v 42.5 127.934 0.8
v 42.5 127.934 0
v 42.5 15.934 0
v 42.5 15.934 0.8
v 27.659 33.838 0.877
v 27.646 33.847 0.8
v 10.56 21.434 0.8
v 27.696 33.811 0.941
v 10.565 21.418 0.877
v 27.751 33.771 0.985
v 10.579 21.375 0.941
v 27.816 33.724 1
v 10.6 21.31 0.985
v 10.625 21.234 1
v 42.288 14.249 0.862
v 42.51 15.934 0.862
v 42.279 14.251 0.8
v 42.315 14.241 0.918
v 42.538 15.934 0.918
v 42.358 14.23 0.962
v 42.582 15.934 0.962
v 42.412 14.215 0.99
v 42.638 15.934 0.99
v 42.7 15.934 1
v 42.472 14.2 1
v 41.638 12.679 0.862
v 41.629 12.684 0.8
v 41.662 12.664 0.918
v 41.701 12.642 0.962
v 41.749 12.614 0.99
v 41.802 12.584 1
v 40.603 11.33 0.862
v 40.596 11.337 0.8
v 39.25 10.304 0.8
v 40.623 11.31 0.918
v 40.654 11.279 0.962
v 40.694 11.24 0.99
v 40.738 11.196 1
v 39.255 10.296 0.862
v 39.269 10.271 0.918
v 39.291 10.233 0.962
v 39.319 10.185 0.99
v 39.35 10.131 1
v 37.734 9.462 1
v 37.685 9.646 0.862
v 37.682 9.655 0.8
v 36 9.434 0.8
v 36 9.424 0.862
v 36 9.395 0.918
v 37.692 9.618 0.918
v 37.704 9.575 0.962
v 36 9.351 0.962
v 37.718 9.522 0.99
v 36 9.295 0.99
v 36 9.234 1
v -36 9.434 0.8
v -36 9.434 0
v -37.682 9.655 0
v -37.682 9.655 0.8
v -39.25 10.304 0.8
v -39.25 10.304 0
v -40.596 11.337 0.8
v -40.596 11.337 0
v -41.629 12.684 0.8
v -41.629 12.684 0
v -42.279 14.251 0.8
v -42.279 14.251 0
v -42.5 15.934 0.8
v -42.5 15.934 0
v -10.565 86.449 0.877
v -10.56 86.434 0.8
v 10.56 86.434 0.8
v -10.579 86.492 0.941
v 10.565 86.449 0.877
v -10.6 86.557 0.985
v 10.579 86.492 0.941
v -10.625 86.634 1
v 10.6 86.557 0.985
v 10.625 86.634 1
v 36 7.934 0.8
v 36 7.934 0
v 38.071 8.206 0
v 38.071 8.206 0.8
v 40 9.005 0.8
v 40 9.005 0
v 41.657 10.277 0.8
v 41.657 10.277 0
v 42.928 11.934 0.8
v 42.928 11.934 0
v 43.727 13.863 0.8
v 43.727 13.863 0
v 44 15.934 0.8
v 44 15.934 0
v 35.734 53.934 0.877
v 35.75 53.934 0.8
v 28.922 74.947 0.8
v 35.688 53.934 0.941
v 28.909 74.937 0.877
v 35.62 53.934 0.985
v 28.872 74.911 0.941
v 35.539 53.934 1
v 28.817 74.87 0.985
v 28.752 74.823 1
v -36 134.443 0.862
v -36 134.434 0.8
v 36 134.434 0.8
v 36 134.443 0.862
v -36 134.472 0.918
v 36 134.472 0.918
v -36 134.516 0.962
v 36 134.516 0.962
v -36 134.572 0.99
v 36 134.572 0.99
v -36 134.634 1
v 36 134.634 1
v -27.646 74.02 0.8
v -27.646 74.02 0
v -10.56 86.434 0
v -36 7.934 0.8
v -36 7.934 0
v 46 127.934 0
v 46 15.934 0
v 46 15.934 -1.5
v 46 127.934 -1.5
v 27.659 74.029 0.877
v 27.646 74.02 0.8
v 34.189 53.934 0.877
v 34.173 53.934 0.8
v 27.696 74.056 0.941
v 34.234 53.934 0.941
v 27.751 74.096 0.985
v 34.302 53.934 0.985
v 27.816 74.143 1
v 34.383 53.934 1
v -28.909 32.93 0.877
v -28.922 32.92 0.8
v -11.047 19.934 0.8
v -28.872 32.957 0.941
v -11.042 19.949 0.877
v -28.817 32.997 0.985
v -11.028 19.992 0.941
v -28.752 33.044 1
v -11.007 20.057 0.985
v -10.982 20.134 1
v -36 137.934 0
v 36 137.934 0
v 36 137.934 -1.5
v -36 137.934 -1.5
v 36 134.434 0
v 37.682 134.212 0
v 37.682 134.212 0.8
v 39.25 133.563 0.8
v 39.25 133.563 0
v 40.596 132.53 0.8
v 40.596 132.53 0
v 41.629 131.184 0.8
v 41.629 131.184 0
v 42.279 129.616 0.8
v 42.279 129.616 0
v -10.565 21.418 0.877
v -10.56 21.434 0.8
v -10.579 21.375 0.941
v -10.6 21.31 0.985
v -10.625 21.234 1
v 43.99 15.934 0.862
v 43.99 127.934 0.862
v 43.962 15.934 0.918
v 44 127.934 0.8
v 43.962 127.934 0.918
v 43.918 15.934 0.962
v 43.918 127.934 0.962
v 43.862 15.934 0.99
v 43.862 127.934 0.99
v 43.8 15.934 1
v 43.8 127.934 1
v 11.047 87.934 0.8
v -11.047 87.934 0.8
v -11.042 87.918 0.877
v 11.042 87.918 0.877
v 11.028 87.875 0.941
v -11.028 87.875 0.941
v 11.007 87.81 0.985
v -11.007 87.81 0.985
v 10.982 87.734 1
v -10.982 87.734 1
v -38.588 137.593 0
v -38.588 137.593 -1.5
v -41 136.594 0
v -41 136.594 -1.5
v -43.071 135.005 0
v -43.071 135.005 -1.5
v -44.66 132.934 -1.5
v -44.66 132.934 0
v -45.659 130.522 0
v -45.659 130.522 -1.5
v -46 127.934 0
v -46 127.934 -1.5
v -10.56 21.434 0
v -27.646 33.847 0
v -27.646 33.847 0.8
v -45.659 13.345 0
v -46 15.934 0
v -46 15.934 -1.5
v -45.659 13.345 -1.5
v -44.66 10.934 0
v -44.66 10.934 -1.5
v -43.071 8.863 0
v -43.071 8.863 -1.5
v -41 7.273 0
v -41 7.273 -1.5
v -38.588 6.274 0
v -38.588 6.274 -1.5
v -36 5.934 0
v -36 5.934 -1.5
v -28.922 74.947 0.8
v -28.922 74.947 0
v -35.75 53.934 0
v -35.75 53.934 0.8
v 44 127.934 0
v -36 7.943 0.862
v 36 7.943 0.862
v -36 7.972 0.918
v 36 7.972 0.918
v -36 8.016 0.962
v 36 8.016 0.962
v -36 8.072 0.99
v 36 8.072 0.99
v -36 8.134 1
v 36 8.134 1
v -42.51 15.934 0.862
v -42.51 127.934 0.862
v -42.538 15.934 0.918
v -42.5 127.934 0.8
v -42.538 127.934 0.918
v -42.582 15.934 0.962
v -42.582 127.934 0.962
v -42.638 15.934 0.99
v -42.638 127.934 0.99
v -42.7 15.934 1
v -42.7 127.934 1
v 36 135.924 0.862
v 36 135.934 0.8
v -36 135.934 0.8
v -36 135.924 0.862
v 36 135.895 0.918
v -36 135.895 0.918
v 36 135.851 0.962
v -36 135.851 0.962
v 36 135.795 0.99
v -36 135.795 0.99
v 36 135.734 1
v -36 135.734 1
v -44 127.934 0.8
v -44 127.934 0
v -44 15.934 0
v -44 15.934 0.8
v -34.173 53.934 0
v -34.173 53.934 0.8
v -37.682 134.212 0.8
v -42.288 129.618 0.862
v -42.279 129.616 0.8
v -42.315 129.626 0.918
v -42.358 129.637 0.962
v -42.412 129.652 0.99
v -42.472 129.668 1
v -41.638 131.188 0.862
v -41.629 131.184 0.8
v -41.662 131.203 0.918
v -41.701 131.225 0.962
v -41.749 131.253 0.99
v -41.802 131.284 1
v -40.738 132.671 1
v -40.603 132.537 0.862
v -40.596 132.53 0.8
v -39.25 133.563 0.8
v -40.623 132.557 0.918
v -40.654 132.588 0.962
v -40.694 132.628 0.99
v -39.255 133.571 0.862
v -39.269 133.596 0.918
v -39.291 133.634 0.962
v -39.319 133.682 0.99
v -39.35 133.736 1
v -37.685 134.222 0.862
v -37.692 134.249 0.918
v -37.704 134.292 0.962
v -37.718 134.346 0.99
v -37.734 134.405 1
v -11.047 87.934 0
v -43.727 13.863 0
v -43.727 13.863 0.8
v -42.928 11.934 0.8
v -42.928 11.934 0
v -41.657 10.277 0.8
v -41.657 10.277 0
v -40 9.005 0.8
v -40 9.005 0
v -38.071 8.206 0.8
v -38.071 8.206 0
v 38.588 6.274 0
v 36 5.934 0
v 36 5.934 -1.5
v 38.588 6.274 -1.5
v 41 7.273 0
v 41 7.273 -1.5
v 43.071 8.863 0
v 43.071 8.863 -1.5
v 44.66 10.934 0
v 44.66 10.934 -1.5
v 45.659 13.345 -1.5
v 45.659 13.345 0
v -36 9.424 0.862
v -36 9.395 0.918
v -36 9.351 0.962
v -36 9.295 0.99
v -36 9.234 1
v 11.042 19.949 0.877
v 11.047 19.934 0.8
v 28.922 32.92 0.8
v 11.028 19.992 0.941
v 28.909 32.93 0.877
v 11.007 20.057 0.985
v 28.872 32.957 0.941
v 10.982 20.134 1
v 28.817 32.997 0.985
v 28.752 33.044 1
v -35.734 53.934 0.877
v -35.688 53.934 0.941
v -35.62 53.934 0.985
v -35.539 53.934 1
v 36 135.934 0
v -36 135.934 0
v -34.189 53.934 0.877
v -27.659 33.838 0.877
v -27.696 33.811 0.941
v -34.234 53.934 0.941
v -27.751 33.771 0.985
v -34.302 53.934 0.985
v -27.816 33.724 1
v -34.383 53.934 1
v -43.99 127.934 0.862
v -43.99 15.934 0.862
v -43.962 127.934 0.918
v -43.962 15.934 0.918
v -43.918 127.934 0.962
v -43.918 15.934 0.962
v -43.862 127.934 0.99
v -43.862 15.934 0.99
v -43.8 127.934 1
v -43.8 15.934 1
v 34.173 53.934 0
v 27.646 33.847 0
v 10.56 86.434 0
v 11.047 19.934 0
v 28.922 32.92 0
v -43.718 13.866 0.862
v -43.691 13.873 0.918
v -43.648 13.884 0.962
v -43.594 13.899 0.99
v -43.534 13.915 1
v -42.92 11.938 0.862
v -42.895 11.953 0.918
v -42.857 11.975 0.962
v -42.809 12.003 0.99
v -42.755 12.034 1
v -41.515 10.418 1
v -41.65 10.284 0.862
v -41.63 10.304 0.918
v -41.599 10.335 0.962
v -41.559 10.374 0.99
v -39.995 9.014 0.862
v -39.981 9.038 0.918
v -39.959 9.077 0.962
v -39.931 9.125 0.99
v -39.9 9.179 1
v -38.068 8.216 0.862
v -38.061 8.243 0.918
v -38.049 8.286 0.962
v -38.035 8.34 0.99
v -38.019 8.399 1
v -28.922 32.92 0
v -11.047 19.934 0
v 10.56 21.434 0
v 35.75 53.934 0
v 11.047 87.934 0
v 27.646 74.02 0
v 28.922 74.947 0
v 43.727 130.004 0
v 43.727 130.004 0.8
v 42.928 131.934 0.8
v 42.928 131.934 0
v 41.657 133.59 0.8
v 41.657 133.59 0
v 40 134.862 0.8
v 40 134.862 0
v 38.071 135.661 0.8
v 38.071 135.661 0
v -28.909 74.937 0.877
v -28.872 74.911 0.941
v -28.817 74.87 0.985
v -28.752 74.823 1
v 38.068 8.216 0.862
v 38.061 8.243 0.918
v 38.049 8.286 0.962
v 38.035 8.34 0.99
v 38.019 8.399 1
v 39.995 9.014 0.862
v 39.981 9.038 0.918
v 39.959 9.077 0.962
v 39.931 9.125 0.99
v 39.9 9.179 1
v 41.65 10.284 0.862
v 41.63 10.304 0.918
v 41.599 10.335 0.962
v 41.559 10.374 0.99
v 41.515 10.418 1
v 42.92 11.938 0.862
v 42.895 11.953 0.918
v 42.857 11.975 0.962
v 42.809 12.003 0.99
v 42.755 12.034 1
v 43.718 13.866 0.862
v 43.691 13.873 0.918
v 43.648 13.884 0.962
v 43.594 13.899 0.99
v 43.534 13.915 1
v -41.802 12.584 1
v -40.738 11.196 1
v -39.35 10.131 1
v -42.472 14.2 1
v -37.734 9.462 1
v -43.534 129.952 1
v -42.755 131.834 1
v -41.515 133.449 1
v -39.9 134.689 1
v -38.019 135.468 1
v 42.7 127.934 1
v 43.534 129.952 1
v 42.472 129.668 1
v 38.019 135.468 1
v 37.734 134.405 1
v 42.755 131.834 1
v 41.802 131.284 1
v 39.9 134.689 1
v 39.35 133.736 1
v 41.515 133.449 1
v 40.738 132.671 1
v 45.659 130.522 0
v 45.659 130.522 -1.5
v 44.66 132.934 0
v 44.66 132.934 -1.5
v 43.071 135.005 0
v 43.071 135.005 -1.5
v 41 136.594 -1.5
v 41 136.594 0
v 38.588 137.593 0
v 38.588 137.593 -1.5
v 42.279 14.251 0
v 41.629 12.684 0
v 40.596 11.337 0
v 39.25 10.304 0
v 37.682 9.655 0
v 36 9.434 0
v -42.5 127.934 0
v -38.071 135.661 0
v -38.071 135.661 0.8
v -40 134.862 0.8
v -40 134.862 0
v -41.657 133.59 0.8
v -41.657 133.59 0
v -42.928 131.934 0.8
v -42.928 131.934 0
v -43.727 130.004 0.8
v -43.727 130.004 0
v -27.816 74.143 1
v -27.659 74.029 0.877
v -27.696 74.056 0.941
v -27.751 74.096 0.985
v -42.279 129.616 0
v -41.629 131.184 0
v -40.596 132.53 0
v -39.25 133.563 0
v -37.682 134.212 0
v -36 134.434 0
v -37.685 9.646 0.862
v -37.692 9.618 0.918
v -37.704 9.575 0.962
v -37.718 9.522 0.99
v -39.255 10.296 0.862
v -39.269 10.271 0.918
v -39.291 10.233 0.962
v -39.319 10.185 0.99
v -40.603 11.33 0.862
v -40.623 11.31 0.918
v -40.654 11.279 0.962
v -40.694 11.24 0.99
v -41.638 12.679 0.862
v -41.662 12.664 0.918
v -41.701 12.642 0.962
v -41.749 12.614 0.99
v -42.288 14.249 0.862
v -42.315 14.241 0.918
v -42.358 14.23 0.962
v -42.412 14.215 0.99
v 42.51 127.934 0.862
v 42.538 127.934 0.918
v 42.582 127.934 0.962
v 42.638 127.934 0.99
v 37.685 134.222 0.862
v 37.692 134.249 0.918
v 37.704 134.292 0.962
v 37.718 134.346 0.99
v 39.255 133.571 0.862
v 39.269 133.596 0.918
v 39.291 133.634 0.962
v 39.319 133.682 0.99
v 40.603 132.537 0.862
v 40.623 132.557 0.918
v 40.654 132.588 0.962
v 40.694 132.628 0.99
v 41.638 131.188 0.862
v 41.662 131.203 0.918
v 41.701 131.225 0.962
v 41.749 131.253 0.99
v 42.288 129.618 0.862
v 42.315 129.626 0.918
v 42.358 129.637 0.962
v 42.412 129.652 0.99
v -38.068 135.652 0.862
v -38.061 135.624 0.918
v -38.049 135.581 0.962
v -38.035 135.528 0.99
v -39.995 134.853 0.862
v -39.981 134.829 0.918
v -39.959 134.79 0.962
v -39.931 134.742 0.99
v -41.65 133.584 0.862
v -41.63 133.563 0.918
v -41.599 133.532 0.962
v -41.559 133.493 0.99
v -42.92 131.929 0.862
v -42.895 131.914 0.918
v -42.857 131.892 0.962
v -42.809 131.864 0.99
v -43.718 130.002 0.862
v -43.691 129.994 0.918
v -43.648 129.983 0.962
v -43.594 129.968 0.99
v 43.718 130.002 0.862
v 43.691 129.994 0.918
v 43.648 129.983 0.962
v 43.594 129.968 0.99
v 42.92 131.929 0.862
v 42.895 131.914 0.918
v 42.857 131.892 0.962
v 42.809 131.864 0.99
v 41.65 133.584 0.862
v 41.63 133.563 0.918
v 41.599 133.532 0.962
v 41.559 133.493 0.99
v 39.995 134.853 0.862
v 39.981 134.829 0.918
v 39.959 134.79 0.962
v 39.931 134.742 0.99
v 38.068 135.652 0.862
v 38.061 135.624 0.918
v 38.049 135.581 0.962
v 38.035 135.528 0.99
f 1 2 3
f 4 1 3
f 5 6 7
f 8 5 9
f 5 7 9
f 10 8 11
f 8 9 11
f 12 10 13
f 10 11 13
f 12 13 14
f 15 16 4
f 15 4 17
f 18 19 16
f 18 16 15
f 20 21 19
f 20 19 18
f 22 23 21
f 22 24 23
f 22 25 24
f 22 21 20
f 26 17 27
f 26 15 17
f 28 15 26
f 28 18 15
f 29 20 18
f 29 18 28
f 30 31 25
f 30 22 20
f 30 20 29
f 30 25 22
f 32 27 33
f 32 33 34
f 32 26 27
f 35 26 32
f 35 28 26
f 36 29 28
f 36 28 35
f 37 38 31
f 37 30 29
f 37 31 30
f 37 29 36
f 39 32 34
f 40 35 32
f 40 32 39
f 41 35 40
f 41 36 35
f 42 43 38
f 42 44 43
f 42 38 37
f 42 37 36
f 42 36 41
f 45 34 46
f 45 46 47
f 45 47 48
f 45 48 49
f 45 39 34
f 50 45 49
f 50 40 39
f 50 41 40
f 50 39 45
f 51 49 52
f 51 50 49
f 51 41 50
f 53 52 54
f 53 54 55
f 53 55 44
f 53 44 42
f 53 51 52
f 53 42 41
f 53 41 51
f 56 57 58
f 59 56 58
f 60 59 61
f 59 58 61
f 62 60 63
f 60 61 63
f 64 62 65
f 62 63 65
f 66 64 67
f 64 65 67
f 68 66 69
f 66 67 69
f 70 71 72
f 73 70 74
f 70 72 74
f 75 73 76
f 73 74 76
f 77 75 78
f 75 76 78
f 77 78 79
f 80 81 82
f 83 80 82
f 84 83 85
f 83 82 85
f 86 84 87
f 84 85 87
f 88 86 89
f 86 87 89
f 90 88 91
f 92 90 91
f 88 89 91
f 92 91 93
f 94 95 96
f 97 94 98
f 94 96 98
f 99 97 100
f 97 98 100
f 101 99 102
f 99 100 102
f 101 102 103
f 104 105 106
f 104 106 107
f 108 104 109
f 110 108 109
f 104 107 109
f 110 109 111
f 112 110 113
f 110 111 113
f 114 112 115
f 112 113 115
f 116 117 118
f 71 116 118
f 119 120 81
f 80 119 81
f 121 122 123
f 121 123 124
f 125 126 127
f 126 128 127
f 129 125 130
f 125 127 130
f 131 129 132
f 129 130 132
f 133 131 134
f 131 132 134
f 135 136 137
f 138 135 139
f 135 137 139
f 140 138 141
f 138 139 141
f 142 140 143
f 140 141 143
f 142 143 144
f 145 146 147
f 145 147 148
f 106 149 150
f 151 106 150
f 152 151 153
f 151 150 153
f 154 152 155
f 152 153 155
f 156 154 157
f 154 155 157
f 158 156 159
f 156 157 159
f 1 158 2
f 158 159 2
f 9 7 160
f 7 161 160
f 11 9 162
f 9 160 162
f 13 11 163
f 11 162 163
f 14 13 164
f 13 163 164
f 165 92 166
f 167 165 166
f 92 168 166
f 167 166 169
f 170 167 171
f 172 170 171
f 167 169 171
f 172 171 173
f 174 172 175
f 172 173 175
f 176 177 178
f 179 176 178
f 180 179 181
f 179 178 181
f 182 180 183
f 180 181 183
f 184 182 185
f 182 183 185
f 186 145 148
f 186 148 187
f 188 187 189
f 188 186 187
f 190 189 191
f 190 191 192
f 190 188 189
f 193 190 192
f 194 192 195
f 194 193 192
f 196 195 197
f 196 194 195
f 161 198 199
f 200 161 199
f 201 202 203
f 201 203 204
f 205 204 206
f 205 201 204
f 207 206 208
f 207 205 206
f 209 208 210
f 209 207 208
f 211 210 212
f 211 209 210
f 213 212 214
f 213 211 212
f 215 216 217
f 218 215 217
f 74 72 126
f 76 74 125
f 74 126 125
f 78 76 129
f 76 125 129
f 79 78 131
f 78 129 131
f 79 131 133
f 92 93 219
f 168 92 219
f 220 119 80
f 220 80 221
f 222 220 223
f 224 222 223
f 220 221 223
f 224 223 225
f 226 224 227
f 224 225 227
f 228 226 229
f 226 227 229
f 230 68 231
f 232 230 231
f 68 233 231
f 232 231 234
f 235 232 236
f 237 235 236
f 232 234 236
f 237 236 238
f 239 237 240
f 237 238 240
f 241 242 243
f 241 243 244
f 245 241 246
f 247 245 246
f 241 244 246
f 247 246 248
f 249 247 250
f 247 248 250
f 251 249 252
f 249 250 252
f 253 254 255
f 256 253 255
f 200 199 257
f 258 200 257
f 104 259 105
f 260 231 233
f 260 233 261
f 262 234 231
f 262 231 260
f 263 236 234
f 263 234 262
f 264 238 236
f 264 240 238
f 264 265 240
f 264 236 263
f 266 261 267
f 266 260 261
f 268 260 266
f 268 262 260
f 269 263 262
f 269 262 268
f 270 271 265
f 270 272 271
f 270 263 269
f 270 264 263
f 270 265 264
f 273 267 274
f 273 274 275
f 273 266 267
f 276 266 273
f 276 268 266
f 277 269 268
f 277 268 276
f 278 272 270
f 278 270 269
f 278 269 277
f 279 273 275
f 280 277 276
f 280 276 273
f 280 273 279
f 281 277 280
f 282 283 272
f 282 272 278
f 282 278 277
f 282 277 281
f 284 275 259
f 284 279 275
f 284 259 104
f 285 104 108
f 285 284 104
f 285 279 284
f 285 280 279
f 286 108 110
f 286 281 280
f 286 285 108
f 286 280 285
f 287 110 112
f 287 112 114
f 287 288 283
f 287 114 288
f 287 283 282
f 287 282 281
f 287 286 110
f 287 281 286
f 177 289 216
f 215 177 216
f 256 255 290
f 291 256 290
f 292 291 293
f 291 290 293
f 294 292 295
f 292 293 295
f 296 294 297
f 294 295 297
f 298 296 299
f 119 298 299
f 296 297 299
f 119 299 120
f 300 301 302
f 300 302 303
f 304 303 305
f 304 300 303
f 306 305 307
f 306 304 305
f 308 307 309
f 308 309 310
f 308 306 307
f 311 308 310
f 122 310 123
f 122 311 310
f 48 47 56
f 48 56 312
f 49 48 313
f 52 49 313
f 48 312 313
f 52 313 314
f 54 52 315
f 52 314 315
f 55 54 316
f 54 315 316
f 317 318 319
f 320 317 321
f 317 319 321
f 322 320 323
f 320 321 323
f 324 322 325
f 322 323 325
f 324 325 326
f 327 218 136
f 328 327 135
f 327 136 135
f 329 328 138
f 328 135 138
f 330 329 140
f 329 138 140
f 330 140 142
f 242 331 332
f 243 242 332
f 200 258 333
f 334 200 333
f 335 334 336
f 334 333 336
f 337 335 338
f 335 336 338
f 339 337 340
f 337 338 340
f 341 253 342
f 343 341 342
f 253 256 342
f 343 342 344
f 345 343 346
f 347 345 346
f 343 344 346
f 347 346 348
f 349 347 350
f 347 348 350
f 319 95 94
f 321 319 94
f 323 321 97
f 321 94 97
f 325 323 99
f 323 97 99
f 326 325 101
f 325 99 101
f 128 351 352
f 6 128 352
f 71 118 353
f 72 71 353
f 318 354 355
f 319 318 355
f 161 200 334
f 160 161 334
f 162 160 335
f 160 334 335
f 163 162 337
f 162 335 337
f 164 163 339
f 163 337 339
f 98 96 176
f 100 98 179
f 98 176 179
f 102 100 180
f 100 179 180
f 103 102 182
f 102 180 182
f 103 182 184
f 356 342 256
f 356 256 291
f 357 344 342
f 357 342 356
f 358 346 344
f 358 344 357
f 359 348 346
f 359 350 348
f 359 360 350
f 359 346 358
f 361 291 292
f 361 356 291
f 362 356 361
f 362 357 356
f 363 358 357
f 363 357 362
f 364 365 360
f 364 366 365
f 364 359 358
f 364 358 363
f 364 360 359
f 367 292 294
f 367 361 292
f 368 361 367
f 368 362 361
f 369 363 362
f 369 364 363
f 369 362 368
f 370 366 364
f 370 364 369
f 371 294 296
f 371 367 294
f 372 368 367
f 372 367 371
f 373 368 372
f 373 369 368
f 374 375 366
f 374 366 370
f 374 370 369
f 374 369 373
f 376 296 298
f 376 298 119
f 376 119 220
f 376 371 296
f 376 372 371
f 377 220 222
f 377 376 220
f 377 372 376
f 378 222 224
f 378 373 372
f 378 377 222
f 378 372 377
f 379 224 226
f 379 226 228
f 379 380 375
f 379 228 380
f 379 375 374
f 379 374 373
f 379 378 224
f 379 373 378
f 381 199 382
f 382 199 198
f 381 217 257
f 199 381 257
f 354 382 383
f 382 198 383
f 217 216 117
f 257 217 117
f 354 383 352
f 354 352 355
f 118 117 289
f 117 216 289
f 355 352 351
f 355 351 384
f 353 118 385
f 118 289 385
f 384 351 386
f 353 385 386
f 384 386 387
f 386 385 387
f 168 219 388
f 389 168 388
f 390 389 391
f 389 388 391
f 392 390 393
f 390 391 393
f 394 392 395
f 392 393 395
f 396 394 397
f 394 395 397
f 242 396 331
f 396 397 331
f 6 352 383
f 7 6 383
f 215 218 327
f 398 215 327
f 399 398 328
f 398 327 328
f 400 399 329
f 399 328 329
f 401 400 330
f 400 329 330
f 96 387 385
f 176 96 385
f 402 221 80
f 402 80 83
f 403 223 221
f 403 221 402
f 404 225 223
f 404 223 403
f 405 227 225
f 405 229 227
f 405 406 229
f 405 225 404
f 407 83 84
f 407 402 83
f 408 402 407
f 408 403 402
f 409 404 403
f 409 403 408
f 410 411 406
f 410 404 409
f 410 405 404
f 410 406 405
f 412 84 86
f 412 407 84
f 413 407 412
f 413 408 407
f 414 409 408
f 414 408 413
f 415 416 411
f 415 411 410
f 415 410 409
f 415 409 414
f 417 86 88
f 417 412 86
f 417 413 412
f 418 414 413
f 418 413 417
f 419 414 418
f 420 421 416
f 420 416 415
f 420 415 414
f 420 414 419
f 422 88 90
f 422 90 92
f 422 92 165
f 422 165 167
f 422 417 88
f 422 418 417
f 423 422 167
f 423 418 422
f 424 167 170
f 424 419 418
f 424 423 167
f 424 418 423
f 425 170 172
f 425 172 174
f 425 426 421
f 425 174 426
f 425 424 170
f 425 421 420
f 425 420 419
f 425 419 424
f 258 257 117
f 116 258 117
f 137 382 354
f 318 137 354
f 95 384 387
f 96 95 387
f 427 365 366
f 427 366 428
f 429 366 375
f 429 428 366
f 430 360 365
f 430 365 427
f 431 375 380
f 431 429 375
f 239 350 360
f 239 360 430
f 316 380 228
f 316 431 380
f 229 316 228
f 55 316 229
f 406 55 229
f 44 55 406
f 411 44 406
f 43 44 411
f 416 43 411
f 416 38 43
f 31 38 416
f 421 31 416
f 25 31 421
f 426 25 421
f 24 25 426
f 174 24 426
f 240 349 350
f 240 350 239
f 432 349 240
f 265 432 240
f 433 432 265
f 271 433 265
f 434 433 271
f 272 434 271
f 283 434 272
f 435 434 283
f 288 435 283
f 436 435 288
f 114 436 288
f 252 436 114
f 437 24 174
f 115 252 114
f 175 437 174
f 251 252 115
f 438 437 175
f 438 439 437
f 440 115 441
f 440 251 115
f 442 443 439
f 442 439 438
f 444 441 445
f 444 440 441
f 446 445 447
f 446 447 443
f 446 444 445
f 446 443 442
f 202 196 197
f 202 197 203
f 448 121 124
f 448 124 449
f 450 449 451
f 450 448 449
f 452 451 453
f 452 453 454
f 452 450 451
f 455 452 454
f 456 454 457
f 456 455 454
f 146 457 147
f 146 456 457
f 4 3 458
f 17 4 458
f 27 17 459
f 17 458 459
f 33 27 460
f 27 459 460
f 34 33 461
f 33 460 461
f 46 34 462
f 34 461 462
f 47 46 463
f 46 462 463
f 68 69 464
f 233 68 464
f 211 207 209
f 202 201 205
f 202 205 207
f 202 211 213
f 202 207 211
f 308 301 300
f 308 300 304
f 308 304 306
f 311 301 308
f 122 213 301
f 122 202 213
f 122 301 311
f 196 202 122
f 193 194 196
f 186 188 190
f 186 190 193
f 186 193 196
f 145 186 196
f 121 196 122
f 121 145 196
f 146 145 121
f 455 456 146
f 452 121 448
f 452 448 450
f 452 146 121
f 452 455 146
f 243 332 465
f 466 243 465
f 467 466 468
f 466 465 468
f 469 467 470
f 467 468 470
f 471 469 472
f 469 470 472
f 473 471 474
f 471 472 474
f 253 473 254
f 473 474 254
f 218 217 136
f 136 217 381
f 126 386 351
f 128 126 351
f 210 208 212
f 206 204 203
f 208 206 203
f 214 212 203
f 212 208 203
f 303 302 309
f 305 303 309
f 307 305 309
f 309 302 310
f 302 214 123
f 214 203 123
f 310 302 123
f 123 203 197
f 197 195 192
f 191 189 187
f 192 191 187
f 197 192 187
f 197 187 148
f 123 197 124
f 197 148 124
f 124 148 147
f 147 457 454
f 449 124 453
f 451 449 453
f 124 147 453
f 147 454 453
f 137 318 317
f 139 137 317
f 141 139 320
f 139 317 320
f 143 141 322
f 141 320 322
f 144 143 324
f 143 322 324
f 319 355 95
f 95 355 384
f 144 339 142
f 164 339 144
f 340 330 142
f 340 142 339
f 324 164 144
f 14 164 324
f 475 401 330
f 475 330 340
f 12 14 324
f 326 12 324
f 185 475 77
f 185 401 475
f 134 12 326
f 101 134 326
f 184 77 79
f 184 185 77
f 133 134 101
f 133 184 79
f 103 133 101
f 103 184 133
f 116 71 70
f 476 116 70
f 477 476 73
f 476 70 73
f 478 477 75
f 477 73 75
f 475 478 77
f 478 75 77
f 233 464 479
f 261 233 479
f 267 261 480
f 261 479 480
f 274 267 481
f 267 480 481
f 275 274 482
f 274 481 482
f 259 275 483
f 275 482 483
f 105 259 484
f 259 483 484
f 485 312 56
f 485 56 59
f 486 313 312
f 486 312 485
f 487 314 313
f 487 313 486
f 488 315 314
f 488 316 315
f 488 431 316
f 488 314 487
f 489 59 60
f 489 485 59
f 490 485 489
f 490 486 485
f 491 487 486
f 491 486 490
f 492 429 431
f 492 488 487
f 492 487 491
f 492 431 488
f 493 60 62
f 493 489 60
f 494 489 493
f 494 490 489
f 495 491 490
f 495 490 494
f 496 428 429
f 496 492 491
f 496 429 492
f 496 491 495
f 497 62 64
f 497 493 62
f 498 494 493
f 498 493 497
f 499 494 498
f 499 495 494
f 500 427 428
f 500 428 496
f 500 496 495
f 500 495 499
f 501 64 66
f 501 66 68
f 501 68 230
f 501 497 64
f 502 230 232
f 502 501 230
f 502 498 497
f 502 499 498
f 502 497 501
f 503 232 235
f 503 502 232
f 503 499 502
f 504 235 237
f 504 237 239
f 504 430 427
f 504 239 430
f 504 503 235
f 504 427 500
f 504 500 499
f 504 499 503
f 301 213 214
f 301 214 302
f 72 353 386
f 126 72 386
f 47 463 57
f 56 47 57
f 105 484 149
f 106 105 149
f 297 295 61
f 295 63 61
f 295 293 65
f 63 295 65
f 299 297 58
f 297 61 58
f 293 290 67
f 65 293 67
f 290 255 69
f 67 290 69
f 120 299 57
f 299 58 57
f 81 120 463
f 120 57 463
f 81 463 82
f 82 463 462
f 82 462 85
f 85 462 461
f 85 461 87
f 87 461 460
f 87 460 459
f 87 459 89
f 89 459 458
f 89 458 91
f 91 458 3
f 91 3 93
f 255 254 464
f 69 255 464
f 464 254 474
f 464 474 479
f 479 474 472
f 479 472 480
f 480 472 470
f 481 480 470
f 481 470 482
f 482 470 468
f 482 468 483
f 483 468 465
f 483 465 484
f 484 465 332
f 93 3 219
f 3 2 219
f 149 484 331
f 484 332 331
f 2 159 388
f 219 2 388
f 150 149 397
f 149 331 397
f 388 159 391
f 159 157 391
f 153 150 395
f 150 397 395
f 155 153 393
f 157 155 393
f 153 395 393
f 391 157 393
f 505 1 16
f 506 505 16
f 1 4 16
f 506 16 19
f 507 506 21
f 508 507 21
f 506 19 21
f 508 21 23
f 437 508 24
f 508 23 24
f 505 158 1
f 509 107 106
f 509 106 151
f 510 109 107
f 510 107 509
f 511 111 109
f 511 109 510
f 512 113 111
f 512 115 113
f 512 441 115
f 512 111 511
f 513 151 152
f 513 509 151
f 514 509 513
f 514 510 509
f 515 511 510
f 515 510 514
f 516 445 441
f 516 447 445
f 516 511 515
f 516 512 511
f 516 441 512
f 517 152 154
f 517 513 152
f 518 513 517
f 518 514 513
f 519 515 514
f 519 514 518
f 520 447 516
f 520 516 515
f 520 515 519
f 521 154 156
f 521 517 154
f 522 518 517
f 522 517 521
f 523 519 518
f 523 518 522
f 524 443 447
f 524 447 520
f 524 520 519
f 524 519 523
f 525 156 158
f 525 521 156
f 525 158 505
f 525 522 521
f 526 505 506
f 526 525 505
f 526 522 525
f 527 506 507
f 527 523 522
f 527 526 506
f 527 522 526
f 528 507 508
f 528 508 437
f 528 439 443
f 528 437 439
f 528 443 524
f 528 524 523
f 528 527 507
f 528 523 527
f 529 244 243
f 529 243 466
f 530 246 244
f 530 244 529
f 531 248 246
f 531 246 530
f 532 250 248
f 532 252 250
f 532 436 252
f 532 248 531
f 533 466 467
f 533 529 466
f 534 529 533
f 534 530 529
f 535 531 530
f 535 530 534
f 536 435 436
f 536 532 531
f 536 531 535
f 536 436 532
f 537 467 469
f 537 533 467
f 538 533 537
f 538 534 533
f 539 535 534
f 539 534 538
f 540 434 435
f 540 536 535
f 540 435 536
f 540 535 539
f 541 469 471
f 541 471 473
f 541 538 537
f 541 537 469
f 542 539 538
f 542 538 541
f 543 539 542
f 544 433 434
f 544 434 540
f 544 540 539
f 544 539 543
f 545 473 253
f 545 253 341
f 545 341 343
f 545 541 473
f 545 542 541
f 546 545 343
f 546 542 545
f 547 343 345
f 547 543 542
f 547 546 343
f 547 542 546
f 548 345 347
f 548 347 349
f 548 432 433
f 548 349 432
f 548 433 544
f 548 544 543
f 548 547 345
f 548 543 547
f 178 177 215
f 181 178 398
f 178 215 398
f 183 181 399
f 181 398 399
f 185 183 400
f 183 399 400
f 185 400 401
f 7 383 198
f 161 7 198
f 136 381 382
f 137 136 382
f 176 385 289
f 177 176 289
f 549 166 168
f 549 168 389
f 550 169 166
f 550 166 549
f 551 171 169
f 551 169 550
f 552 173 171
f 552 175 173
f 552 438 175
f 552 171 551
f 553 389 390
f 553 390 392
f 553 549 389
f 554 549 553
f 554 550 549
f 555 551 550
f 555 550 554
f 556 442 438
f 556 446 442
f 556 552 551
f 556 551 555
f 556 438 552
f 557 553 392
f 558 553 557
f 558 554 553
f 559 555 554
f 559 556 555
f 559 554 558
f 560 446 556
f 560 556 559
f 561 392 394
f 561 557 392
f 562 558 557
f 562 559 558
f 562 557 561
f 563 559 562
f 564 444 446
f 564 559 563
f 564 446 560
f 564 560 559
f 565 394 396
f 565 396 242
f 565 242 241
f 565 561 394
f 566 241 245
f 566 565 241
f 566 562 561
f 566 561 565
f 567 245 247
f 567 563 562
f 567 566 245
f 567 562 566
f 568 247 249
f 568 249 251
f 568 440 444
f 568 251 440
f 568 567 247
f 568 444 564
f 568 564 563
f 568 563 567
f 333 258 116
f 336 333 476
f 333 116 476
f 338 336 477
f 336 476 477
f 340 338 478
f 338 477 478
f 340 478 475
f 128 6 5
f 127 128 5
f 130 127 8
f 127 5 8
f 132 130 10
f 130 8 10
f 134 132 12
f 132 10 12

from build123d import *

# Parameters (mm, degrees)
F3_DEPTH = 1
F4_R     = 0.2
F6_DEPTH = 1.5


with BuildPart() as f3:
    # F1 (on Top) + F2 (on Top) → F3 (new body)
    with BuildSketch(Plane.XY):
        Polygon((-11.04727, 87.93359), (-28.922127, 74.946746), (-35.749716, 53.93359), (-28.922127, 32.920435), (-11.04727, 19.93359), (11.04727, 19.93359), (28.922127, 32.920435), (35.749716, 53.93359), (28.922127, 74.946746), (11.04727, 87.93359), align=None)
        Polygon((-10.55989, 86.43359), (10.55989, 86.43359), (27.646151, 74.019695), (34.172522, 53.93359), (27.646151, 33.847485), (10.55989, 21.43359), (-10.55989, 21.43359), (-27.646151, 33.847485), (-34.172522, 53.93359), (-27.646151, 74.019695), align=None, mode=Mode.SUBTRACT)
    with BuildSketch(Plane.XY):
        with BuildLine():
            Line((36, 135.93359), (-36, 135.93359))
            ThreePointArc((-36, 135.93359), (-41.656854, 133.590444), (-44, 127.93359))
            Line((-44, 127.93359), (-44, 15.93359))
            ThreePointArc((-44, 15.93359), (-41.656854, 10.276736), (-36, 7.93359))
            Line((-36, 7.93359), (36, 7.93359))
            ThreePointArc((36, 7.93359), (41.656854, 10.276736), (44, 15.93359))
            Line((44, 15.93359), (44, 127.93359))
            ThreePointArc((44, 127.93359), (41.656854, 133.590444), (36, 135.93359))
        make_face()
        with BuildLine():
            ThreePointArc((-42.5, 127.93359), (-40.596194, 132.529784), (-36, 134.43359))
            Line((-36, 134.43359), (36, 134.43359))
            ThreePointArc((36, 134.43359), (40.596194, 132.529784), (42.5, 127.93359))
            Line((42.5, 127.93359), (42.5, 15.93359))
            ThreePointArc((42.5, 15.93359), (40.596194, 11.337396), (36, 9.43359))
            Line((36, 9.43359), (-36, 9.43359))
            ThreePointArc((-36, 9.43359), (-40.596194, 11.337396), (-42.5, 15.93359))
            Line((-42.5, 15.93359), (-42.5, 127.93359))
        make_face(mode=Mode.SUBTRACT)
    extrude(amount=F3_DEPTH)

    # F4
    f4_edges = [f3.edges().sort_by_distance(p)[0] for p in [
        (44, 71.93359, 1),
        (41.656854, 133.590444, 1),
        (0, 135.93359, 1),
        (-41.656854, 133.590444, 1),
        (-44, 71.93359, 1),
        (-41.656854, 10.276736, 1),
        (0, 7.93359, 1),
        (41.656854, 10.276736, 1),
        (-42.5, 71.93359, 1),
        (-40.596194, 132.529784, 1),
        (0, 134.43359, 1),
        (40.596194, 132.529784, 1),
        (42.5, 71.93359, 1),
        (40.596194, 11.337396, 1),
        (0, 9.43359, 1),
        (-40.596194, 11.337396, 1),
        (19.984699, 81.440168, 1),
        (0, 87.93359, 1),
        (-19.984699, 81.440168, 1),
        (-32.335922, 64.440168, 1),
        (-32.335922, 43.427012, 1),
        (-19.984699, 26.427012, 1),
        (0, 19.93359, 1),
        (19.984699, 26.427012, 1),
        (32.335922, 43.427012, 1),
        (32.335922, 64.440168, 1),
        (-30.909337, 63.976642, 1),
        (-19.103021, 80.226642, 1),
        (0, 86.43359, 1),
        (19.103021, 80.226642, 1),
        (30.909337, 63.976642, 1),
        (30.909337, 43.890538, 1),
        (19.103021, 27.640538, 1),
        (0, 21.43359, 1),
        (-19.103021, 27.640538, 1),
        (-30.909337, 43.890538, 1),
    ]]
    fillet(f4_edges, radius=F4_R)


with BuildPart() as f6:
    # F0 (on Top) → F6 (new body)
    with BuildSketch(Plane.XY):
        with BuildLine():
            Line((36, 137.93359), (-36, 137.93359))
            ThreePointArc((-36, 137.93359), (-43.071068, 135.004658), (-46, 127.93359))
            Line((-46, 127.93359), (-46, 71.93359))
            Line((-46, 71.93359), (-46, 15.93359))
            ThreePointArc((-46, 15.93359), (-43.071068, 8.862522), (-36, 5.93359))
            Line((-36, 5.93359), (36, 5.93359))
            ThreePointArc((36, 5.93359), (43.071068, 8.862522), (46, 15.93359))
            Line((46, 15.93359), (46, 127.93359))
            ThreePointArc((46, 127.93359), (43.071068, 135.004658), (36, 137.93359))
        make_face()
    extrude(amount=-F6_DEPTH)


solid = Compound([f3.part, f6.part])
